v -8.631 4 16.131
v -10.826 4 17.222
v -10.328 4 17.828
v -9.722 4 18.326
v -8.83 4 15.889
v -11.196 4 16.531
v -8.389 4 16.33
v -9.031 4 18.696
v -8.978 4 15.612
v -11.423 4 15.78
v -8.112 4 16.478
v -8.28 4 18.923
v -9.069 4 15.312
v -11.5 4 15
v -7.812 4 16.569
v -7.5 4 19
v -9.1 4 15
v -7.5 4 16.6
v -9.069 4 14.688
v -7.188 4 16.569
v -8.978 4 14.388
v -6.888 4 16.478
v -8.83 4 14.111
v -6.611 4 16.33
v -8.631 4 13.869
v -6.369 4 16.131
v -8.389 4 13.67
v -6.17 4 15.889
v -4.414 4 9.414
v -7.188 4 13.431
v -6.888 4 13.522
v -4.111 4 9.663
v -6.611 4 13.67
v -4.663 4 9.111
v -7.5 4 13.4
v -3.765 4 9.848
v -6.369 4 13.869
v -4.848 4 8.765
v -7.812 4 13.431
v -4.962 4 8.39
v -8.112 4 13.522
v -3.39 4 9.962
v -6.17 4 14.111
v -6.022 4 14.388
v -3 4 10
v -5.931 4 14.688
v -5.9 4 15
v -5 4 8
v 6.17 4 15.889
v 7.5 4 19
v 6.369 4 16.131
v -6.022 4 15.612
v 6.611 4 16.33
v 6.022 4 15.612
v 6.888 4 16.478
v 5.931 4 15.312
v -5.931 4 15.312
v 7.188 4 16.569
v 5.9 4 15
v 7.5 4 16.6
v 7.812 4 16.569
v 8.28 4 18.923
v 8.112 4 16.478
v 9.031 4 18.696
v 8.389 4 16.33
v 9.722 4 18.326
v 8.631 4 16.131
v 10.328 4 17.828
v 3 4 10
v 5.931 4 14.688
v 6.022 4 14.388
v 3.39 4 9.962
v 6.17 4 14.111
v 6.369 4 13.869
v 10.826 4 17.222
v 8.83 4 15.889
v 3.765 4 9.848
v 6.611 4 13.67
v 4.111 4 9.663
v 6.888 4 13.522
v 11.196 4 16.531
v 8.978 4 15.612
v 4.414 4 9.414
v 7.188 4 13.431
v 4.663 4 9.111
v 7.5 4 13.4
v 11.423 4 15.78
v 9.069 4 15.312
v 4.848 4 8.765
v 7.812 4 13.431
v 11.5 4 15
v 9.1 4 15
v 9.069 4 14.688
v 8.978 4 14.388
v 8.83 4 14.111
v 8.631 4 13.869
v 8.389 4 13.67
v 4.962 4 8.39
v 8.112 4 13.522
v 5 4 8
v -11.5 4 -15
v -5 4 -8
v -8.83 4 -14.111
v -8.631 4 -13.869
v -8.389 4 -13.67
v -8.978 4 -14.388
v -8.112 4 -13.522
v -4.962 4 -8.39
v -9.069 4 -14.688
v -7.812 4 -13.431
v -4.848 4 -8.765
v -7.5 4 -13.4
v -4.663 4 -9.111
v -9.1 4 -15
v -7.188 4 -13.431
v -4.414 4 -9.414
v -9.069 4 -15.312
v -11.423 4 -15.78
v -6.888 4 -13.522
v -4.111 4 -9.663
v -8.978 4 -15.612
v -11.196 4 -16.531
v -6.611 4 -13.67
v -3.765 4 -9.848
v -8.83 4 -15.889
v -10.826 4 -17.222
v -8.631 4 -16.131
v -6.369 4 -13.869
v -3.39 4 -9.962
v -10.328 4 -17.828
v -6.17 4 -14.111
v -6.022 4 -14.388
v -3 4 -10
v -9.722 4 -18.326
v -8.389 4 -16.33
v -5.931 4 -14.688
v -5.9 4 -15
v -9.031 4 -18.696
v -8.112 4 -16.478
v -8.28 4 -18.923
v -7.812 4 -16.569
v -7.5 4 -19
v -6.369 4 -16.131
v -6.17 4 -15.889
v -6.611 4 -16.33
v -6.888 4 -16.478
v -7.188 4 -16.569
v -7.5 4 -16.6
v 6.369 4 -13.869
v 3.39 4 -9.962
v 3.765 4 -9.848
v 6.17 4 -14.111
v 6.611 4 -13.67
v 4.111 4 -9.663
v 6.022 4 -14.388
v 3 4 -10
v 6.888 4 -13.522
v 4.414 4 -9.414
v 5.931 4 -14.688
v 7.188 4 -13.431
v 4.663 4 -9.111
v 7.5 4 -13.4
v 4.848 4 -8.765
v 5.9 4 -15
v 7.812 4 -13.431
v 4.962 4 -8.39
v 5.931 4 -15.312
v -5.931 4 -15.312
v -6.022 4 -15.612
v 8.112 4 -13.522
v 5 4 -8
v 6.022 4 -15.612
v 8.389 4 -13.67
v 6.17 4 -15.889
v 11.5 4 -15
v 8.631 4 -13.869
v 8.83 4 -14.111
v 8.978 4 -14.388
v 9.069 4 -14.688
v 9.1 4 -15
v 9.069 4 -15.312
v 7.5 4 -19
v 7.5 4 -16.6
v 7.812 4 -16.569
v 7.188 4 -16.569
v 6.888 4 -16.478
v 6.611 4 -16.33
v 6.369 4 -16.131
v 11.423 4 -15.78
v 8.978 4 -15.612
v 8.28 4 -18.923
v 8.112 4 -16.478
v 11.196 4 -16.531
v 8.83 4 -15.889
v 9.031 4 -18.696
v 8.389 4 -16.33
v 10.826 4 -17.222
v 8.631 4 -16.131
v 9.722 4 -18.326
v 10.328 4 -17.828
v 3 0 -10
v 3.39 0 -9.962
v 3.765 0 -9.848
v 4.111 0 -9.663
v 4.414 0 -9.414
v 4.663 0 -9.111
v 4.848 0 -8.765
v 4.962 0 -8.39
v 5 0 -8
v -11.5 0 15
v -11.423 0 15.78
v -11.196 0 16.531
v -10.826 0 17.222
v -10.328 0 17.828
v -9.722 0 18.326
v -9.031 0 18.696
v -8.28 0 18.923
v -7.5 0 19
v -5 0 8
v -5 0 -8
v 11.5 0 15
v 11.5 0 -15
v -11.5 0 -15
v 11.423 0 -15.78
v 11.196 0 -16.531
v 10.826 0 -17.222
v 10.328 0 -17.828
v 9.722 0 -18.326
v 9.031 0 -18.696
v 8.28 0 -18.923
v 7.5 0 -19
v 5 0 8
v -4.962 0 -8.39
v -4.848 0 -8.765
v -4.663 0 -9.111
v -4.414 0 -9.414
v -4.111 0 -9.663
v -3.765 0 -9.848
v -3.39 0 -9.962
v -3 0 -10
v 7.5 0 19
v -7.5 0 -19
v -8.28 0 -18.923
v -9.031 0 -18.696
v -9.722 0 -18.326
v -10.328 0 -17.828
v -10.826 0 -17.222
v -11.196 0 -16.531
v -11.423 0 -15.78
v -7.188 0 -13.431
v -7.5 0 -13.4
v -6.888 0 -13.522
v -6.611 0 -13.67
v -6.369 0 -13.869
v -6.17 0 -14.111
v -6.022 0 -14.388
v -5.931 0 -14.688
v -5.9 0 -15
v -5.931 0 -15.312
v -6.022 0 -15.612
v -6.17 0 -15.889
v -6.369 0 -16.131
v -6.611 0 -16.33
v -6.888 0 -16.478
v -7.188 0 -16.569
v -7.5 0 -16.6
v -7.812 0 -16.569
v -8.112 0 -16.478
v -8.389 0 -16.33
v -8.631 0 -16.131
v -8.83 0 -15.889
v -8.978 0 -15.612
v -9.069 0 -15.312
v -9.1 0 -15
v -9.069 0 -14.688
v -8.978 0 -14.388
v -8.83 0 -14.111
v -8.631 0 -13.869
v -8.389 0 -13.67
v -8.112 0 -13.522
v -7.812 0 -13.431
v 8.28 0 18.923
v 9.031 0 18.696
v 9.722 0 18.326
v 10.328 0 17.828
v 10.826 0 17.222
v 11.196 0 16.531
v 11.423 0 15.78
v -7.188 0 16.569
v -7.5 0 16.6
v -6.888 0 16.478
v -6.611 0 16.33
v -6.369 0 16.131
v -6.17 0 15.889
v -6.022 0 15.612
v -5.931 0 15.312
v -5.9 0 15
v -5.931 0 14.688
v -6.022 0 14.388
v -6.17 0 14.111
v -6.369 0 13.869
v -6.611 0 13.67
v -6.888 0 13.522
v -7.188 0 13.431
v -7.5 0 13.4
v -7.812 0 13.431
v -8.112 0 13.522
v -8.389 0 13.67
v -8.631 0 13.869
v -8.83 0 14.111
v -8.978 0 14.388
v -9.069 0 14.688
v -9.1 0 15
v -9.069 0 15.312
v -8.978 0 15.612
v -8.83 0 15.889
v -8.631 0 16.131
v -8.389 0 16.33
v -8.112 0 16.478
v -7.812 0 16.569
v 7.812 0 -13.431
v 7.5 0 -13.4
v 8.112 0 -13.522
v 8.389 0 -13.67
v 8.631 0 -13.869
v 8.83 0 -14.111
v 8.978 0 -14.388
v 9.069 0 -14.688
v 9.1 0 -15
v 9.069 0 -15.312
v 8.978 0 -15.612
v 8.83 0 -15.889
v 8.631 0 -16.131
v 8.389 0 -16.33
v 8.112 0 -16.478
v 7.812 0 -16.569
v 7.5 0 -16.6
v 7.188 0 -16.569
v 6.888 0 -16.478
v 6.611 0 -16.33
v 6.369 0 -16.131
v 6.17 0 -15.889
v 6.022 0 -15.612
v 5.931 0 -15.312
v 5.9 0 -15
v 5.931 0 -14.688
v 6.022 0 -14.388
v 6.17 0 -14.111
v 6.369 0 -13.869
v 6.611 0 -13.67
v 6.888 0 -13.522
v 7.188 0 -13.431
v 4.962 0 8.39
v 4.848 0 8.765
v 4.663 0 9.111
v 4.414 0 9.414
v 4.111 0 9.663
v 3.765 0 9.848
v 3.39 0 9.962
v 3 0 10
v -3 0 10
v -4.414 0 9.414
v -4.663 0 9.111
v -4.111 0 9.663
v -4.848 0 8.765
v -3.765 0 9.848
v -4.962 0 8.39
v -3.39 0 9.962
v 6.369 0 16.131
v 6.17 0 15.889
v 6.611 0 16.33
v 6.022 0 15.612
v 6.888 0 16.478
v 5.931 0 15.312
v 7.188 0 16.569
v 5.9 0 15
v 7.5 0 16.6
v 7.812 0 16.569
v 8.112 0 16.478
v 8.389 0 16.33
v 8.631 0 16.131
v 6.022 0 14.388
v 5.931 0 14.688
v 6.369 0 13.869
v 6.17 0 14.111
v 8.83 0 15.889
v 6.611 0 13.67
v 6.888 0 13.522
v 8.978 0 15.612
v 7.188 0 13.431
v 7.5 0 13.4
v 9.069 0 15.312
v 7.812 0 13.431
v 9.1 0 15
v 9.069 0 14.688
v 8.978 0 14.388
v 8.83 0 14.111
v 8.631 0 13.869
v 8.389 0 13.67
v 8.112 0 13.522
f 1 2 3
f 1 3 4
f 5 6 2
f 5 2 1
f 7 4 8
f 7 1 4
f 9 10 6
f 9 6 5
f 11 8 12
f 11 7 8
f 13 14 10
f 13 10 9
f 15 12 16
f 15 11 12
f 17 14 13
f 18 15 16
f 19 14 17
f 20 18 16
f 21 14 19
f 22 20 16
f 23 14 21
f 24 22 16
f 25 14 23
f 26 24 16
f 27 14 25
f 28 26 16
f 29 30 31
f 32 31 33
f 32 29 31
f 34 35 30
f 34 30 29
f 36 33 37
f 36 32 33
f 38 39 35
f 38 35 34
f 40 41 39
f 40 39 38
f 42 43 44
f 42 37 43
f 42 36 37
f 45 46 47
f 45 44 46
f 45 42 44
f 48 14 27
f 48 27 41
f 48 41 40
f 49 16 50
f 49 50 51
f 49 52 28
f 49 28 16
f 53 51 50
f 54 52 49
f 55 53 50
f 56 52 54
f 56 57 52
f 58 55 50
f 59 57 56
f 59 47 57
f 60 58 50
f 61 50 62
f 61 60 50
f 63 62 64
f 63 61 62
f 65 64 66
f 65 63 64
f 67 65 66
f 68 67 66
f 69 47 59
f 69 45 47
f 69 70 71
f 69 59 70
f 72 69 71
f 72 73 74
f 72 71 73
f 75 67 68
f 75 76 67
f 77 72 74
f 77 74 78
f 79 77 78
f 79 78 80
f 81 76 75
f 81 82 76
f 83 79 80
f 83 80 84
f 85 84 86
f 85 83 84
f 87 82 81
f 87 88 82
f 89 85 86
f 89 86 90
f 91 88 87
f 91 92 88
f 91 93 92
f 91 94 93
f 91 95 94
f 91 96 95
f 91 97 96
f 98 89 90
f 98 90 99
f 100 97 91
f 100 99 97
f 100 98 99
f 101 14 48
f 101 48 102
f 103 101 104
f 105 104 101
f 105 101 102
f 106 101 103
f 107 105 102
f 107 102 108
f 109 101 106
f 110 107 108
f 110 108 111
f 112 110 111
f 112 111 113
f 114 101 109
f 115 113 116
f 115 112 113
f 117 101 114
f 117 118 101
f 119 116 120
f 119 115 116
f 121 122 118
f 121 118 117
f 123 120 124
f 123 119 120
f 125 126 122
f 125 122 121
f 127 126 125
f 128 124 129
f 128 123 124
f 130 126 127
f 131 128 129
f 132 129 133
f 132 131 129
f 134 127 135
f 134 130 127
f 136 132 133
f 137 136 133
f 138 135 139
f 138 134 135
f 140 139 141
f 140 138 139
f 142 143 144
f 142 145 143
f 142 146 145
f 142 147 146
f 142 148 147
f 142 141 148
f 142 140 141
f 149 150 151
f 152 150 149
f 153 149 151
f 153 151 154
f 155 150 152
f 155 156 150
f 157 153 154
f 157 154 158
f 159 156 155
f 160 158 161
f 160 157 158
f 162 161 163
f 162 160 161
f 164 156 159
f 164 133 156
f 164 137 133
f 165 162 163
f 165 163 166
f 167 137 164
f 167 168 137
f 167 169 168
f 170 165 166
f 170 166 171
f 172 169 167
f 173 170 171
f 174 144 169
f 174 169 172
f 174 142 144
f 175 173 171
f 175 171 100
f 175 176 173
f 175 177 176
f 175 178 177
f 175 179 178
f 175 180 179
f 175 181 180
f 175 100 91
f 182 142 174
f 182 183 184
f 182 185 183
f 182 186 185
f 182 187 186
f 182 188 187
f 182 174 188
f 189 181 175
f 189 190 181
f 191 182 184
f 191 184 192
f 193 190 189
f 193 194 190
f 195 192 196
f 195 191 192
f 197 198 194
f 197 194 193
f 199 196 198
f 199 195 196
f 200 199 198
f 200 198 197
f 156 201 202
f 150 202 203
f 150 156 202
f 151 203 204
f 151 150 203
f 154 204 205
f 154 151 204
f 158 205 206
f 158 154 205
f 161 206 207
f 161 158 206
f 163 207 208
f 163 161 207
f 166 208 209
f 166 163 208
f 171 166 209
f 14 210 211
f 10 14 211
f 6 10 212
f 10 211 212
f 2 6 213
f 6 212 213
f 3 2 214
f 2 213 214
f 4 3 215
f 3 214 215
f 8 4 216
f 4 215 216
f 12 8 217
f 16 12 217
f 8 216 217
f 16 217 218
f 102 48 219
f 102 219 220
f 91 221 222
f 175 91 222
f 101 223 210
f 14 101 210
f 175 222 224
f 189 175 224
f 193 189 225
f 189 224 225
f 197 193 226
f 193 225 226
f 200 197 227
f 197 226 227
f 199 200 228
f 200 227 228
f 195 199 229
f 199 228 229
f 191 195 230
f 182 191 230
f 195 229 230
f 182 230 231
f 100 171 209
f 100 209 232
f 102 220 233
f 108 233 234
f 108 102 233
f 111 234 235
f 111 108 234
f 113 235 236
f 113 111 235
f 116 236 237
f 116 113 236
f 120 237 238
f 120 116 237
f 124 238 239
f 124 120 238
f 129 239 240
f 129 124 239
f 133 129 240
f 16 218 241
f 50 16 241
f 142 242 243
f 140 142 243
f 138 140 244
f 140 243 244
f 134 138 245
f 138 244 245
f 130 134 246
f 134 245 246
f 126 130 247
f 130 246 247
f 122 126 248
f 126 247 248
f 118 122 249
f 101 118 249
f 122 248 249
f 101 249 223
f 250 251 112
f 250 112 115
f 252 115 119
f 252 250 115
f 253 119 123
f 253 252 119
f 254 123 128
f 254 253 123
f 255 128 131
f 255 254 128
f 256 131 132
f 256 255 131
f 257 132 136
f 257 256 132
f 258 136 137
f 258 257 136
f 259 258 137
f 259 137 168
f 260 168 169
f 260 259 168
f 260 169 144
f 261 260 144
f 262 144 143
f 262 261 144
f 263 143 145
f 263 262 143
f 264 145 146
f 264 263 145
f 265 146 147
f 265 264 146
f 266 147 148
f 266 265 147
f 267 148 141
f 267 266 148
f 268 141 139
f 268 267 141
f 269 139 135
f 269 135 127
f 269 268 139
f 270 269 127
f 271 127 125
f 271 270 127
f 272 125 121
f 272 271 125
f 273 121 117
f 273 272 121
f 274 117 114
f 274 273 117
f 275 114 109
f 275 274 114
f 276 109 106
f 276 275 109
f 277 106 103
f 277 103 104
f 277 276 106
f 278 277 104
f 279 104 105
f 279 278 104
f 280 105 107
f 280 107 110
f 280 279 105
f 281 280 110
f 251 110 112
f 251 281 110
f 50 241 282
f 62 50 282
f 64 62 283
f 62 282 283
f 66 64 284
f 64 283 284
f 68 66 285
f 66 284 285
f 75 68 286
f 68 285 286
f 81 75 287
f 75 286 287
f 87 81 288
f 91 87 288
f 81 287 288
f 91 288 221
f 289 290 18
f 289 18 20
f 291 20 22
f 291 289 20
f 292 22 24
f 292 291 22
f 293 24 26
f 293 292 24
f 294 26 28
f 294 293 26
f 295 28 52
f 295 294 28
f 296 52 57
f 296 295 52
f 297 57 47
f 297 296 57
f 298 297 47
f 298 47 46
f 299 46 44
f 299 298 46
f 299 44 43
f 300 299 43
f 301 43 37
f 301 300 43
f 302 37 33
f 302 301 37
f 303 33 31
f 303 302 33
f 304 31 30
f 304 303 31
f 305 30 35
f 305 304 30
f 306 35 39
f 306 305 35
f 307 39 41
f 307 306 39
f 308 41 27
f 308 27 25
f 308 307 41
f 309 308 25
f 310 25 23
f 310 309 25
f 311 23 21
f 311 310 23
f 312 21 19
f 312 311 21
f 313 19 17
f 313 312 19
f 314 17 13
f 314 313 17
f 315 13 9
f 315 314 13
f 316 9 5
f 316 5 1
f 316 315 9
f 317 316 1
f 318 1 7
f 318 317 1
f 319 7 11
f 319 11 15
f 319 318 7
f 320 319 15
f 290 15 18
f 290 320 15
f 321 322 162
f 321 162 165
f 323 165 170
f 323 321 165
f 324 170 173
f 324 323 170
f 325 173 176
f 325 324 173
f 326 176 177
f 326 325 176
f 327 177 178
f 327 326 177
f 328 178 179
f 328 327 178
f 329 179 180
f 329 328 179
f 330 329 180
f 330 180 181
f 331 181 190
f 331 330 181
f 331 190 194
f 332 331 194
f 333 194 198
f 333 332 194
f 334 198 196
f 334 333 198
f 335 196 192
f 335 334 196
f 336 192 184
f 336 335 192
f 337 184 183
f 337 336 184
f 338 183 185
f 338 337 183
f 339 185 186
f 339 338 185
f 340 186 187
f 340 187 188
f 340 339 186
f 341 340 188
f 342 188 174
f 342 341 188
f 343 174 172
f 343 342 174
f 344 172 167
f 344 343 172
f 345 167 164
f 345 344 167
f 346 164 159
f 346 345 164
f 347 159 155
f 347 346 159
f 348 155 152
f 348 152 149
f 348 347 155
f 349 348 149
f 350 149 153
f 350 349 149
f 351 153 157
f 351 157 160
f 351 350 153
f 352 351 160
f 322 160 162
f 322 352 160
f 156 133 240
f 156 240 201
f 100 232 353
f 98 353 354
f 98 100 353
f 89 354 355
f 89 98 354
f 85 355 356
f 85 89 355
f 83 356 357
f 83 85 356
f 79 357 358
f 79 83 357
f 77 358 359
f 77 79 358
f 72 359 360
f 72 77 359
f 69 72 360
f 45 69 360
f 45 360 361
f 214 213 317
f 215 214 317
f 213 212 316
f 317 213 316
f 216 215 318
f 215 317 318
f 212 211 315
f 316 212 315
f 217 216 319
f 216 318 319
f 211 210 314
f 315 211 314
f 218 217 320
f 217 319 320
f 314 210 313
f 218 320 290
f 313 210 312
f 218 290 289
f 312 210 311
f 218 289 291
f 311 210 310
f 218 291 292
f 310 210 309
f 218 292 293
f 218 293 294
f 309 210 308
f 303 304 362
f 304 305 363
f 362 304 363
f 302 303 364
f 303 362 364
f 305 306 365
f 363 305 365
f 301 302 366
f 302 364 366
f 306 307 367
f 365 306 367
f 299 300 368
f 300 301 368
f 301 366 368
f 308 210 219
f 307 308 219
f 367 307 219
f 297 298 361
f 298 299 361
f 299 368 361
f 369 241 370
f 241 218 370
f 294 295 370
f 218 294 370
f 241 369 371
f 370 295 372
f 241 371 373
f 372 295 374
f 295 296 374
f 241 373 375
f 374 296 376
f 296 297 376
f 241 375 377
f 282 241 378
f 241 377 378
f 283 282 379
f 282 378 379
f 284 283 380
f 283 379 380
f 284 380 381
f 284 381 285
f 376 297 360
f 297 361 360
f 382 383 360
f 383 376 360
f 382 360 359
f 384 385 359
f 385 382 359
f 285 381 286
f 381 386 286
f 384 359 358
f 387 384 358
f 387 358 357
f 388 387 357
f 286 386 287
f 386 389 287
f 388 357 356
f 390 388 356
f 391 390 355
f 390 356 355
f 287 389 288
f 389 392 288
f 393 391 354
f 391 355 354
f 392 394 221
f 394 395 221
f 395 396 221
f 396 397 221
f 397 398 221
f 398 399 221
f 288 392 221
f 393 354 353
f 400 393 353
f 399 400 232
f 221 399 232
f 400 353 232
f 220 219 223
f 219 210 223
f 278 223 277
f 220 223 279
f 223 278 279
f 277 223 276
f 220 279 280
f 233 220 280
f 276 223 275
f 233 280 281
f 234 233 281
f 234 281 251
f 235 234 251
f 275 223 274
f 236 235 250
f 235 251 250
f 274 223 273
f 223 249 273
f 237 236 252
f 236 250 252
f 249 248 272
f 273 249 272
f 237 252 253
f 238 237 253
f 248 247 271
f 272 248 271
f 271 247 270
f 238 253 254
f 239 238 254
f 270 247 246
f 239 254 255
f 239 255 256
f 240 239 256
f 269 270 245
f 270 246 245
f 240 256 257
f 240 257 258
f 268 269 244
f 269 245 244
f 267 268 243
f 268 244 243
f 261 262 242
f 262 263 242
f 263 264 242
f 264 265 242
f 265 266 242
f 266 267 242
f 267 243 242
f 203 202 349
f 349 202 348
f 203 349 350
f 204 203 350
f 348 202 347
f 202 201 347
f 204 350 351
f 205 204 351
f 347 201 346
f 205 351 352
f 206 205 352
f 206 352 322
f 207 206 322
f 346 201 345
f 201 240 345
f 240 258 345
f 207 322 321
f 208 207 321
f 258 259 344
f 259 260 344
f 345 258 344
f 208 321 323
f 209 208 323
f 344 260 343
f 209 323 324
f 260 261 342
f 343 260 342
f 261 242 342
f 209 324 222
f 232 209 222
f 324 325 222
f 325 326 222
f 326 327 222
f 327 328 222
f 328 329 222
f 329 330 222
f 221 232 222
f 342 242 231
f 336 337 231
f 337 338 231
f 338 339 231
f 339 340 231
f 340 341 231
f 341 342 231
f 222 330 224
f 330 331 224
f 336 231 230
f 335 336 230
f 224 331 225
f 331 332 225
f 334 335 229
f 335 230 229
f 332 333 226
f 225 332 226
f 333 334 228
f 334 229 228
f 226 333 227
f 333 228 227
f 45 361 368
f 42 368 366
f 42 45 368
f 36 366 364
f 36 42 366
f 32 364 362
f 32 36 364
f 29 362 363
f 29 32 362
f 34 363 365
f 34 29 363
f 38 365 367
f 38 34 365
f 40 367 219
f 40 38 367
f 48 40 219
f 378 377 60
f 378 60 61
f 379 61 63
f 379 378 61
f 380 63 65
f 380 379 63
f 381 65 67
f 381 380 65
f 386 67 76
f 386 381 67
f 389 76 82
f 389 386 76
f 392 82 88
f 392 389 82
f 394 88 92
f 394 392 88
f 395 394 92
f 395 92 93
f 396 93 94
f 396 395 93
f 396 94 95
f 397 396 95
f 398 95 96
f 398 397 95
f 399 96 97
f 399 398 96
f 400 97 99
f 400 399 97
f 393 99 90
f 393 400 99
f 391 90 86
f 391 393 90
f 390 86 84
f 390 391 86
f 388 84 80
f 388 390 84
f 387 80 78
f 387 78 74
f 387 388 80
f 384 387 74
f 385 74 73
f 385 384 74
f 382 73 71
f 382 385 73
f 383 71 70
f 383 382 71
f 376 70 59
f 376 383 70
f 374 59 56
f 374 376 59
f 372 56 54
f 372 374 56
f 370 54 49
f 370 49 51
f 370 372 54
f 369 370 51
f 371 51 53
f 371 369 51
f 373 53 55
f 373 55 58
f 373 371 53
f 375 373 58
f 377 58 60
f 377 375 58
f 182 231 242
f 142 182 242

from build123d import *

# Parameters (mm, degrees)
SKETCH1_R           = 1.6
BOSS_EXTRUDE1_DEPTH = 4
CUT_EXTRUDE1_DEPTH  = 23.566568193


with BuildPart() as part:
    # Sketch1 → Boss-Extrude1 (new body)
    with BuildSketch(Plane(origin=(0, 0, 0), x_dir=(1, 0, 0), z_dir=(0, 1, 0))):
        with BuildLine():
            Line((-11.5, 15), (-11.5, -15))
            ThreePointArc((-11.5, -15), (-10.328427125, -17.828427125), (-7.5, -19))
            Line((-7.5, -19), (7.5, -19))
            ThreePointArc((7.5, -19), (10.328427125, -17.828427125), (11.5, -15))
            Line((11.5, -15), (11.5, 15))
            ThreePointArc((11.5, 15), (10.328427125, 17.828427125), (7.5, 19))
            Line((7.5, 19), (-7.5, 19))
            ThreePointArc((-7.5, 19), (-10.328427125, 17.828427125), (-11.5, 15))
        make_face()
        with Locations(Location((-7.5, 15, 0), (0, 0, 270))):
            Circle(SKETCH1_R, mode=Mode.SUBTRACT)
        with Locations(Location((7.5, 15, 0), (0, 0, 270))):
            Circle(SKETCH1_R, mode=Mode.SUBTRACT)
        with Locations(Location((-7.5, -15, 0), (0, 0, 270))):
            Circle(SKETCH1_R, mode=Mode.SUBTRACT)
        with Locations(Location((7.5, -15, 0), (0, 0, 270))):
            Circle(SKETCH1_R, mode=Mode.SUBTRACT)
    extrude(amount=BOSS_EXTRUDE1_DEPTH)

    # Sketch2 → Cut-Extrude1 (cut, through all)
    with BuildSketch(Plane(origin=(0, 4, 0), x_dir=(1, 0, 0), z_dir=(0, 1, 0))):
        with BuildLine():
            Line((-3, 10), (3, 10))
            ThreePointArc((3, 10), (4.414213562, 9.414213562), (5, 8))
            Line((5, 8), (5, -8))
            ThreePointArc((5, -8), (4.414213562, -9.414213562), (3, -10))
            Line((3, -10), (-3, -10))
            ThreePointArc((-3, -10), (-4.414213562, -9.414213562), (-5, -8))
            Line((-5, -8), (-5, 8))
            ThreePointArc((-5, 8), (-4.414213562, 9.414213562), (-3, 10))
        make_face()
    extrude(amount=-CUT_EXTRUDE1_DEPTH, mode=Mode.SUBTRACT)


solid = part.part
